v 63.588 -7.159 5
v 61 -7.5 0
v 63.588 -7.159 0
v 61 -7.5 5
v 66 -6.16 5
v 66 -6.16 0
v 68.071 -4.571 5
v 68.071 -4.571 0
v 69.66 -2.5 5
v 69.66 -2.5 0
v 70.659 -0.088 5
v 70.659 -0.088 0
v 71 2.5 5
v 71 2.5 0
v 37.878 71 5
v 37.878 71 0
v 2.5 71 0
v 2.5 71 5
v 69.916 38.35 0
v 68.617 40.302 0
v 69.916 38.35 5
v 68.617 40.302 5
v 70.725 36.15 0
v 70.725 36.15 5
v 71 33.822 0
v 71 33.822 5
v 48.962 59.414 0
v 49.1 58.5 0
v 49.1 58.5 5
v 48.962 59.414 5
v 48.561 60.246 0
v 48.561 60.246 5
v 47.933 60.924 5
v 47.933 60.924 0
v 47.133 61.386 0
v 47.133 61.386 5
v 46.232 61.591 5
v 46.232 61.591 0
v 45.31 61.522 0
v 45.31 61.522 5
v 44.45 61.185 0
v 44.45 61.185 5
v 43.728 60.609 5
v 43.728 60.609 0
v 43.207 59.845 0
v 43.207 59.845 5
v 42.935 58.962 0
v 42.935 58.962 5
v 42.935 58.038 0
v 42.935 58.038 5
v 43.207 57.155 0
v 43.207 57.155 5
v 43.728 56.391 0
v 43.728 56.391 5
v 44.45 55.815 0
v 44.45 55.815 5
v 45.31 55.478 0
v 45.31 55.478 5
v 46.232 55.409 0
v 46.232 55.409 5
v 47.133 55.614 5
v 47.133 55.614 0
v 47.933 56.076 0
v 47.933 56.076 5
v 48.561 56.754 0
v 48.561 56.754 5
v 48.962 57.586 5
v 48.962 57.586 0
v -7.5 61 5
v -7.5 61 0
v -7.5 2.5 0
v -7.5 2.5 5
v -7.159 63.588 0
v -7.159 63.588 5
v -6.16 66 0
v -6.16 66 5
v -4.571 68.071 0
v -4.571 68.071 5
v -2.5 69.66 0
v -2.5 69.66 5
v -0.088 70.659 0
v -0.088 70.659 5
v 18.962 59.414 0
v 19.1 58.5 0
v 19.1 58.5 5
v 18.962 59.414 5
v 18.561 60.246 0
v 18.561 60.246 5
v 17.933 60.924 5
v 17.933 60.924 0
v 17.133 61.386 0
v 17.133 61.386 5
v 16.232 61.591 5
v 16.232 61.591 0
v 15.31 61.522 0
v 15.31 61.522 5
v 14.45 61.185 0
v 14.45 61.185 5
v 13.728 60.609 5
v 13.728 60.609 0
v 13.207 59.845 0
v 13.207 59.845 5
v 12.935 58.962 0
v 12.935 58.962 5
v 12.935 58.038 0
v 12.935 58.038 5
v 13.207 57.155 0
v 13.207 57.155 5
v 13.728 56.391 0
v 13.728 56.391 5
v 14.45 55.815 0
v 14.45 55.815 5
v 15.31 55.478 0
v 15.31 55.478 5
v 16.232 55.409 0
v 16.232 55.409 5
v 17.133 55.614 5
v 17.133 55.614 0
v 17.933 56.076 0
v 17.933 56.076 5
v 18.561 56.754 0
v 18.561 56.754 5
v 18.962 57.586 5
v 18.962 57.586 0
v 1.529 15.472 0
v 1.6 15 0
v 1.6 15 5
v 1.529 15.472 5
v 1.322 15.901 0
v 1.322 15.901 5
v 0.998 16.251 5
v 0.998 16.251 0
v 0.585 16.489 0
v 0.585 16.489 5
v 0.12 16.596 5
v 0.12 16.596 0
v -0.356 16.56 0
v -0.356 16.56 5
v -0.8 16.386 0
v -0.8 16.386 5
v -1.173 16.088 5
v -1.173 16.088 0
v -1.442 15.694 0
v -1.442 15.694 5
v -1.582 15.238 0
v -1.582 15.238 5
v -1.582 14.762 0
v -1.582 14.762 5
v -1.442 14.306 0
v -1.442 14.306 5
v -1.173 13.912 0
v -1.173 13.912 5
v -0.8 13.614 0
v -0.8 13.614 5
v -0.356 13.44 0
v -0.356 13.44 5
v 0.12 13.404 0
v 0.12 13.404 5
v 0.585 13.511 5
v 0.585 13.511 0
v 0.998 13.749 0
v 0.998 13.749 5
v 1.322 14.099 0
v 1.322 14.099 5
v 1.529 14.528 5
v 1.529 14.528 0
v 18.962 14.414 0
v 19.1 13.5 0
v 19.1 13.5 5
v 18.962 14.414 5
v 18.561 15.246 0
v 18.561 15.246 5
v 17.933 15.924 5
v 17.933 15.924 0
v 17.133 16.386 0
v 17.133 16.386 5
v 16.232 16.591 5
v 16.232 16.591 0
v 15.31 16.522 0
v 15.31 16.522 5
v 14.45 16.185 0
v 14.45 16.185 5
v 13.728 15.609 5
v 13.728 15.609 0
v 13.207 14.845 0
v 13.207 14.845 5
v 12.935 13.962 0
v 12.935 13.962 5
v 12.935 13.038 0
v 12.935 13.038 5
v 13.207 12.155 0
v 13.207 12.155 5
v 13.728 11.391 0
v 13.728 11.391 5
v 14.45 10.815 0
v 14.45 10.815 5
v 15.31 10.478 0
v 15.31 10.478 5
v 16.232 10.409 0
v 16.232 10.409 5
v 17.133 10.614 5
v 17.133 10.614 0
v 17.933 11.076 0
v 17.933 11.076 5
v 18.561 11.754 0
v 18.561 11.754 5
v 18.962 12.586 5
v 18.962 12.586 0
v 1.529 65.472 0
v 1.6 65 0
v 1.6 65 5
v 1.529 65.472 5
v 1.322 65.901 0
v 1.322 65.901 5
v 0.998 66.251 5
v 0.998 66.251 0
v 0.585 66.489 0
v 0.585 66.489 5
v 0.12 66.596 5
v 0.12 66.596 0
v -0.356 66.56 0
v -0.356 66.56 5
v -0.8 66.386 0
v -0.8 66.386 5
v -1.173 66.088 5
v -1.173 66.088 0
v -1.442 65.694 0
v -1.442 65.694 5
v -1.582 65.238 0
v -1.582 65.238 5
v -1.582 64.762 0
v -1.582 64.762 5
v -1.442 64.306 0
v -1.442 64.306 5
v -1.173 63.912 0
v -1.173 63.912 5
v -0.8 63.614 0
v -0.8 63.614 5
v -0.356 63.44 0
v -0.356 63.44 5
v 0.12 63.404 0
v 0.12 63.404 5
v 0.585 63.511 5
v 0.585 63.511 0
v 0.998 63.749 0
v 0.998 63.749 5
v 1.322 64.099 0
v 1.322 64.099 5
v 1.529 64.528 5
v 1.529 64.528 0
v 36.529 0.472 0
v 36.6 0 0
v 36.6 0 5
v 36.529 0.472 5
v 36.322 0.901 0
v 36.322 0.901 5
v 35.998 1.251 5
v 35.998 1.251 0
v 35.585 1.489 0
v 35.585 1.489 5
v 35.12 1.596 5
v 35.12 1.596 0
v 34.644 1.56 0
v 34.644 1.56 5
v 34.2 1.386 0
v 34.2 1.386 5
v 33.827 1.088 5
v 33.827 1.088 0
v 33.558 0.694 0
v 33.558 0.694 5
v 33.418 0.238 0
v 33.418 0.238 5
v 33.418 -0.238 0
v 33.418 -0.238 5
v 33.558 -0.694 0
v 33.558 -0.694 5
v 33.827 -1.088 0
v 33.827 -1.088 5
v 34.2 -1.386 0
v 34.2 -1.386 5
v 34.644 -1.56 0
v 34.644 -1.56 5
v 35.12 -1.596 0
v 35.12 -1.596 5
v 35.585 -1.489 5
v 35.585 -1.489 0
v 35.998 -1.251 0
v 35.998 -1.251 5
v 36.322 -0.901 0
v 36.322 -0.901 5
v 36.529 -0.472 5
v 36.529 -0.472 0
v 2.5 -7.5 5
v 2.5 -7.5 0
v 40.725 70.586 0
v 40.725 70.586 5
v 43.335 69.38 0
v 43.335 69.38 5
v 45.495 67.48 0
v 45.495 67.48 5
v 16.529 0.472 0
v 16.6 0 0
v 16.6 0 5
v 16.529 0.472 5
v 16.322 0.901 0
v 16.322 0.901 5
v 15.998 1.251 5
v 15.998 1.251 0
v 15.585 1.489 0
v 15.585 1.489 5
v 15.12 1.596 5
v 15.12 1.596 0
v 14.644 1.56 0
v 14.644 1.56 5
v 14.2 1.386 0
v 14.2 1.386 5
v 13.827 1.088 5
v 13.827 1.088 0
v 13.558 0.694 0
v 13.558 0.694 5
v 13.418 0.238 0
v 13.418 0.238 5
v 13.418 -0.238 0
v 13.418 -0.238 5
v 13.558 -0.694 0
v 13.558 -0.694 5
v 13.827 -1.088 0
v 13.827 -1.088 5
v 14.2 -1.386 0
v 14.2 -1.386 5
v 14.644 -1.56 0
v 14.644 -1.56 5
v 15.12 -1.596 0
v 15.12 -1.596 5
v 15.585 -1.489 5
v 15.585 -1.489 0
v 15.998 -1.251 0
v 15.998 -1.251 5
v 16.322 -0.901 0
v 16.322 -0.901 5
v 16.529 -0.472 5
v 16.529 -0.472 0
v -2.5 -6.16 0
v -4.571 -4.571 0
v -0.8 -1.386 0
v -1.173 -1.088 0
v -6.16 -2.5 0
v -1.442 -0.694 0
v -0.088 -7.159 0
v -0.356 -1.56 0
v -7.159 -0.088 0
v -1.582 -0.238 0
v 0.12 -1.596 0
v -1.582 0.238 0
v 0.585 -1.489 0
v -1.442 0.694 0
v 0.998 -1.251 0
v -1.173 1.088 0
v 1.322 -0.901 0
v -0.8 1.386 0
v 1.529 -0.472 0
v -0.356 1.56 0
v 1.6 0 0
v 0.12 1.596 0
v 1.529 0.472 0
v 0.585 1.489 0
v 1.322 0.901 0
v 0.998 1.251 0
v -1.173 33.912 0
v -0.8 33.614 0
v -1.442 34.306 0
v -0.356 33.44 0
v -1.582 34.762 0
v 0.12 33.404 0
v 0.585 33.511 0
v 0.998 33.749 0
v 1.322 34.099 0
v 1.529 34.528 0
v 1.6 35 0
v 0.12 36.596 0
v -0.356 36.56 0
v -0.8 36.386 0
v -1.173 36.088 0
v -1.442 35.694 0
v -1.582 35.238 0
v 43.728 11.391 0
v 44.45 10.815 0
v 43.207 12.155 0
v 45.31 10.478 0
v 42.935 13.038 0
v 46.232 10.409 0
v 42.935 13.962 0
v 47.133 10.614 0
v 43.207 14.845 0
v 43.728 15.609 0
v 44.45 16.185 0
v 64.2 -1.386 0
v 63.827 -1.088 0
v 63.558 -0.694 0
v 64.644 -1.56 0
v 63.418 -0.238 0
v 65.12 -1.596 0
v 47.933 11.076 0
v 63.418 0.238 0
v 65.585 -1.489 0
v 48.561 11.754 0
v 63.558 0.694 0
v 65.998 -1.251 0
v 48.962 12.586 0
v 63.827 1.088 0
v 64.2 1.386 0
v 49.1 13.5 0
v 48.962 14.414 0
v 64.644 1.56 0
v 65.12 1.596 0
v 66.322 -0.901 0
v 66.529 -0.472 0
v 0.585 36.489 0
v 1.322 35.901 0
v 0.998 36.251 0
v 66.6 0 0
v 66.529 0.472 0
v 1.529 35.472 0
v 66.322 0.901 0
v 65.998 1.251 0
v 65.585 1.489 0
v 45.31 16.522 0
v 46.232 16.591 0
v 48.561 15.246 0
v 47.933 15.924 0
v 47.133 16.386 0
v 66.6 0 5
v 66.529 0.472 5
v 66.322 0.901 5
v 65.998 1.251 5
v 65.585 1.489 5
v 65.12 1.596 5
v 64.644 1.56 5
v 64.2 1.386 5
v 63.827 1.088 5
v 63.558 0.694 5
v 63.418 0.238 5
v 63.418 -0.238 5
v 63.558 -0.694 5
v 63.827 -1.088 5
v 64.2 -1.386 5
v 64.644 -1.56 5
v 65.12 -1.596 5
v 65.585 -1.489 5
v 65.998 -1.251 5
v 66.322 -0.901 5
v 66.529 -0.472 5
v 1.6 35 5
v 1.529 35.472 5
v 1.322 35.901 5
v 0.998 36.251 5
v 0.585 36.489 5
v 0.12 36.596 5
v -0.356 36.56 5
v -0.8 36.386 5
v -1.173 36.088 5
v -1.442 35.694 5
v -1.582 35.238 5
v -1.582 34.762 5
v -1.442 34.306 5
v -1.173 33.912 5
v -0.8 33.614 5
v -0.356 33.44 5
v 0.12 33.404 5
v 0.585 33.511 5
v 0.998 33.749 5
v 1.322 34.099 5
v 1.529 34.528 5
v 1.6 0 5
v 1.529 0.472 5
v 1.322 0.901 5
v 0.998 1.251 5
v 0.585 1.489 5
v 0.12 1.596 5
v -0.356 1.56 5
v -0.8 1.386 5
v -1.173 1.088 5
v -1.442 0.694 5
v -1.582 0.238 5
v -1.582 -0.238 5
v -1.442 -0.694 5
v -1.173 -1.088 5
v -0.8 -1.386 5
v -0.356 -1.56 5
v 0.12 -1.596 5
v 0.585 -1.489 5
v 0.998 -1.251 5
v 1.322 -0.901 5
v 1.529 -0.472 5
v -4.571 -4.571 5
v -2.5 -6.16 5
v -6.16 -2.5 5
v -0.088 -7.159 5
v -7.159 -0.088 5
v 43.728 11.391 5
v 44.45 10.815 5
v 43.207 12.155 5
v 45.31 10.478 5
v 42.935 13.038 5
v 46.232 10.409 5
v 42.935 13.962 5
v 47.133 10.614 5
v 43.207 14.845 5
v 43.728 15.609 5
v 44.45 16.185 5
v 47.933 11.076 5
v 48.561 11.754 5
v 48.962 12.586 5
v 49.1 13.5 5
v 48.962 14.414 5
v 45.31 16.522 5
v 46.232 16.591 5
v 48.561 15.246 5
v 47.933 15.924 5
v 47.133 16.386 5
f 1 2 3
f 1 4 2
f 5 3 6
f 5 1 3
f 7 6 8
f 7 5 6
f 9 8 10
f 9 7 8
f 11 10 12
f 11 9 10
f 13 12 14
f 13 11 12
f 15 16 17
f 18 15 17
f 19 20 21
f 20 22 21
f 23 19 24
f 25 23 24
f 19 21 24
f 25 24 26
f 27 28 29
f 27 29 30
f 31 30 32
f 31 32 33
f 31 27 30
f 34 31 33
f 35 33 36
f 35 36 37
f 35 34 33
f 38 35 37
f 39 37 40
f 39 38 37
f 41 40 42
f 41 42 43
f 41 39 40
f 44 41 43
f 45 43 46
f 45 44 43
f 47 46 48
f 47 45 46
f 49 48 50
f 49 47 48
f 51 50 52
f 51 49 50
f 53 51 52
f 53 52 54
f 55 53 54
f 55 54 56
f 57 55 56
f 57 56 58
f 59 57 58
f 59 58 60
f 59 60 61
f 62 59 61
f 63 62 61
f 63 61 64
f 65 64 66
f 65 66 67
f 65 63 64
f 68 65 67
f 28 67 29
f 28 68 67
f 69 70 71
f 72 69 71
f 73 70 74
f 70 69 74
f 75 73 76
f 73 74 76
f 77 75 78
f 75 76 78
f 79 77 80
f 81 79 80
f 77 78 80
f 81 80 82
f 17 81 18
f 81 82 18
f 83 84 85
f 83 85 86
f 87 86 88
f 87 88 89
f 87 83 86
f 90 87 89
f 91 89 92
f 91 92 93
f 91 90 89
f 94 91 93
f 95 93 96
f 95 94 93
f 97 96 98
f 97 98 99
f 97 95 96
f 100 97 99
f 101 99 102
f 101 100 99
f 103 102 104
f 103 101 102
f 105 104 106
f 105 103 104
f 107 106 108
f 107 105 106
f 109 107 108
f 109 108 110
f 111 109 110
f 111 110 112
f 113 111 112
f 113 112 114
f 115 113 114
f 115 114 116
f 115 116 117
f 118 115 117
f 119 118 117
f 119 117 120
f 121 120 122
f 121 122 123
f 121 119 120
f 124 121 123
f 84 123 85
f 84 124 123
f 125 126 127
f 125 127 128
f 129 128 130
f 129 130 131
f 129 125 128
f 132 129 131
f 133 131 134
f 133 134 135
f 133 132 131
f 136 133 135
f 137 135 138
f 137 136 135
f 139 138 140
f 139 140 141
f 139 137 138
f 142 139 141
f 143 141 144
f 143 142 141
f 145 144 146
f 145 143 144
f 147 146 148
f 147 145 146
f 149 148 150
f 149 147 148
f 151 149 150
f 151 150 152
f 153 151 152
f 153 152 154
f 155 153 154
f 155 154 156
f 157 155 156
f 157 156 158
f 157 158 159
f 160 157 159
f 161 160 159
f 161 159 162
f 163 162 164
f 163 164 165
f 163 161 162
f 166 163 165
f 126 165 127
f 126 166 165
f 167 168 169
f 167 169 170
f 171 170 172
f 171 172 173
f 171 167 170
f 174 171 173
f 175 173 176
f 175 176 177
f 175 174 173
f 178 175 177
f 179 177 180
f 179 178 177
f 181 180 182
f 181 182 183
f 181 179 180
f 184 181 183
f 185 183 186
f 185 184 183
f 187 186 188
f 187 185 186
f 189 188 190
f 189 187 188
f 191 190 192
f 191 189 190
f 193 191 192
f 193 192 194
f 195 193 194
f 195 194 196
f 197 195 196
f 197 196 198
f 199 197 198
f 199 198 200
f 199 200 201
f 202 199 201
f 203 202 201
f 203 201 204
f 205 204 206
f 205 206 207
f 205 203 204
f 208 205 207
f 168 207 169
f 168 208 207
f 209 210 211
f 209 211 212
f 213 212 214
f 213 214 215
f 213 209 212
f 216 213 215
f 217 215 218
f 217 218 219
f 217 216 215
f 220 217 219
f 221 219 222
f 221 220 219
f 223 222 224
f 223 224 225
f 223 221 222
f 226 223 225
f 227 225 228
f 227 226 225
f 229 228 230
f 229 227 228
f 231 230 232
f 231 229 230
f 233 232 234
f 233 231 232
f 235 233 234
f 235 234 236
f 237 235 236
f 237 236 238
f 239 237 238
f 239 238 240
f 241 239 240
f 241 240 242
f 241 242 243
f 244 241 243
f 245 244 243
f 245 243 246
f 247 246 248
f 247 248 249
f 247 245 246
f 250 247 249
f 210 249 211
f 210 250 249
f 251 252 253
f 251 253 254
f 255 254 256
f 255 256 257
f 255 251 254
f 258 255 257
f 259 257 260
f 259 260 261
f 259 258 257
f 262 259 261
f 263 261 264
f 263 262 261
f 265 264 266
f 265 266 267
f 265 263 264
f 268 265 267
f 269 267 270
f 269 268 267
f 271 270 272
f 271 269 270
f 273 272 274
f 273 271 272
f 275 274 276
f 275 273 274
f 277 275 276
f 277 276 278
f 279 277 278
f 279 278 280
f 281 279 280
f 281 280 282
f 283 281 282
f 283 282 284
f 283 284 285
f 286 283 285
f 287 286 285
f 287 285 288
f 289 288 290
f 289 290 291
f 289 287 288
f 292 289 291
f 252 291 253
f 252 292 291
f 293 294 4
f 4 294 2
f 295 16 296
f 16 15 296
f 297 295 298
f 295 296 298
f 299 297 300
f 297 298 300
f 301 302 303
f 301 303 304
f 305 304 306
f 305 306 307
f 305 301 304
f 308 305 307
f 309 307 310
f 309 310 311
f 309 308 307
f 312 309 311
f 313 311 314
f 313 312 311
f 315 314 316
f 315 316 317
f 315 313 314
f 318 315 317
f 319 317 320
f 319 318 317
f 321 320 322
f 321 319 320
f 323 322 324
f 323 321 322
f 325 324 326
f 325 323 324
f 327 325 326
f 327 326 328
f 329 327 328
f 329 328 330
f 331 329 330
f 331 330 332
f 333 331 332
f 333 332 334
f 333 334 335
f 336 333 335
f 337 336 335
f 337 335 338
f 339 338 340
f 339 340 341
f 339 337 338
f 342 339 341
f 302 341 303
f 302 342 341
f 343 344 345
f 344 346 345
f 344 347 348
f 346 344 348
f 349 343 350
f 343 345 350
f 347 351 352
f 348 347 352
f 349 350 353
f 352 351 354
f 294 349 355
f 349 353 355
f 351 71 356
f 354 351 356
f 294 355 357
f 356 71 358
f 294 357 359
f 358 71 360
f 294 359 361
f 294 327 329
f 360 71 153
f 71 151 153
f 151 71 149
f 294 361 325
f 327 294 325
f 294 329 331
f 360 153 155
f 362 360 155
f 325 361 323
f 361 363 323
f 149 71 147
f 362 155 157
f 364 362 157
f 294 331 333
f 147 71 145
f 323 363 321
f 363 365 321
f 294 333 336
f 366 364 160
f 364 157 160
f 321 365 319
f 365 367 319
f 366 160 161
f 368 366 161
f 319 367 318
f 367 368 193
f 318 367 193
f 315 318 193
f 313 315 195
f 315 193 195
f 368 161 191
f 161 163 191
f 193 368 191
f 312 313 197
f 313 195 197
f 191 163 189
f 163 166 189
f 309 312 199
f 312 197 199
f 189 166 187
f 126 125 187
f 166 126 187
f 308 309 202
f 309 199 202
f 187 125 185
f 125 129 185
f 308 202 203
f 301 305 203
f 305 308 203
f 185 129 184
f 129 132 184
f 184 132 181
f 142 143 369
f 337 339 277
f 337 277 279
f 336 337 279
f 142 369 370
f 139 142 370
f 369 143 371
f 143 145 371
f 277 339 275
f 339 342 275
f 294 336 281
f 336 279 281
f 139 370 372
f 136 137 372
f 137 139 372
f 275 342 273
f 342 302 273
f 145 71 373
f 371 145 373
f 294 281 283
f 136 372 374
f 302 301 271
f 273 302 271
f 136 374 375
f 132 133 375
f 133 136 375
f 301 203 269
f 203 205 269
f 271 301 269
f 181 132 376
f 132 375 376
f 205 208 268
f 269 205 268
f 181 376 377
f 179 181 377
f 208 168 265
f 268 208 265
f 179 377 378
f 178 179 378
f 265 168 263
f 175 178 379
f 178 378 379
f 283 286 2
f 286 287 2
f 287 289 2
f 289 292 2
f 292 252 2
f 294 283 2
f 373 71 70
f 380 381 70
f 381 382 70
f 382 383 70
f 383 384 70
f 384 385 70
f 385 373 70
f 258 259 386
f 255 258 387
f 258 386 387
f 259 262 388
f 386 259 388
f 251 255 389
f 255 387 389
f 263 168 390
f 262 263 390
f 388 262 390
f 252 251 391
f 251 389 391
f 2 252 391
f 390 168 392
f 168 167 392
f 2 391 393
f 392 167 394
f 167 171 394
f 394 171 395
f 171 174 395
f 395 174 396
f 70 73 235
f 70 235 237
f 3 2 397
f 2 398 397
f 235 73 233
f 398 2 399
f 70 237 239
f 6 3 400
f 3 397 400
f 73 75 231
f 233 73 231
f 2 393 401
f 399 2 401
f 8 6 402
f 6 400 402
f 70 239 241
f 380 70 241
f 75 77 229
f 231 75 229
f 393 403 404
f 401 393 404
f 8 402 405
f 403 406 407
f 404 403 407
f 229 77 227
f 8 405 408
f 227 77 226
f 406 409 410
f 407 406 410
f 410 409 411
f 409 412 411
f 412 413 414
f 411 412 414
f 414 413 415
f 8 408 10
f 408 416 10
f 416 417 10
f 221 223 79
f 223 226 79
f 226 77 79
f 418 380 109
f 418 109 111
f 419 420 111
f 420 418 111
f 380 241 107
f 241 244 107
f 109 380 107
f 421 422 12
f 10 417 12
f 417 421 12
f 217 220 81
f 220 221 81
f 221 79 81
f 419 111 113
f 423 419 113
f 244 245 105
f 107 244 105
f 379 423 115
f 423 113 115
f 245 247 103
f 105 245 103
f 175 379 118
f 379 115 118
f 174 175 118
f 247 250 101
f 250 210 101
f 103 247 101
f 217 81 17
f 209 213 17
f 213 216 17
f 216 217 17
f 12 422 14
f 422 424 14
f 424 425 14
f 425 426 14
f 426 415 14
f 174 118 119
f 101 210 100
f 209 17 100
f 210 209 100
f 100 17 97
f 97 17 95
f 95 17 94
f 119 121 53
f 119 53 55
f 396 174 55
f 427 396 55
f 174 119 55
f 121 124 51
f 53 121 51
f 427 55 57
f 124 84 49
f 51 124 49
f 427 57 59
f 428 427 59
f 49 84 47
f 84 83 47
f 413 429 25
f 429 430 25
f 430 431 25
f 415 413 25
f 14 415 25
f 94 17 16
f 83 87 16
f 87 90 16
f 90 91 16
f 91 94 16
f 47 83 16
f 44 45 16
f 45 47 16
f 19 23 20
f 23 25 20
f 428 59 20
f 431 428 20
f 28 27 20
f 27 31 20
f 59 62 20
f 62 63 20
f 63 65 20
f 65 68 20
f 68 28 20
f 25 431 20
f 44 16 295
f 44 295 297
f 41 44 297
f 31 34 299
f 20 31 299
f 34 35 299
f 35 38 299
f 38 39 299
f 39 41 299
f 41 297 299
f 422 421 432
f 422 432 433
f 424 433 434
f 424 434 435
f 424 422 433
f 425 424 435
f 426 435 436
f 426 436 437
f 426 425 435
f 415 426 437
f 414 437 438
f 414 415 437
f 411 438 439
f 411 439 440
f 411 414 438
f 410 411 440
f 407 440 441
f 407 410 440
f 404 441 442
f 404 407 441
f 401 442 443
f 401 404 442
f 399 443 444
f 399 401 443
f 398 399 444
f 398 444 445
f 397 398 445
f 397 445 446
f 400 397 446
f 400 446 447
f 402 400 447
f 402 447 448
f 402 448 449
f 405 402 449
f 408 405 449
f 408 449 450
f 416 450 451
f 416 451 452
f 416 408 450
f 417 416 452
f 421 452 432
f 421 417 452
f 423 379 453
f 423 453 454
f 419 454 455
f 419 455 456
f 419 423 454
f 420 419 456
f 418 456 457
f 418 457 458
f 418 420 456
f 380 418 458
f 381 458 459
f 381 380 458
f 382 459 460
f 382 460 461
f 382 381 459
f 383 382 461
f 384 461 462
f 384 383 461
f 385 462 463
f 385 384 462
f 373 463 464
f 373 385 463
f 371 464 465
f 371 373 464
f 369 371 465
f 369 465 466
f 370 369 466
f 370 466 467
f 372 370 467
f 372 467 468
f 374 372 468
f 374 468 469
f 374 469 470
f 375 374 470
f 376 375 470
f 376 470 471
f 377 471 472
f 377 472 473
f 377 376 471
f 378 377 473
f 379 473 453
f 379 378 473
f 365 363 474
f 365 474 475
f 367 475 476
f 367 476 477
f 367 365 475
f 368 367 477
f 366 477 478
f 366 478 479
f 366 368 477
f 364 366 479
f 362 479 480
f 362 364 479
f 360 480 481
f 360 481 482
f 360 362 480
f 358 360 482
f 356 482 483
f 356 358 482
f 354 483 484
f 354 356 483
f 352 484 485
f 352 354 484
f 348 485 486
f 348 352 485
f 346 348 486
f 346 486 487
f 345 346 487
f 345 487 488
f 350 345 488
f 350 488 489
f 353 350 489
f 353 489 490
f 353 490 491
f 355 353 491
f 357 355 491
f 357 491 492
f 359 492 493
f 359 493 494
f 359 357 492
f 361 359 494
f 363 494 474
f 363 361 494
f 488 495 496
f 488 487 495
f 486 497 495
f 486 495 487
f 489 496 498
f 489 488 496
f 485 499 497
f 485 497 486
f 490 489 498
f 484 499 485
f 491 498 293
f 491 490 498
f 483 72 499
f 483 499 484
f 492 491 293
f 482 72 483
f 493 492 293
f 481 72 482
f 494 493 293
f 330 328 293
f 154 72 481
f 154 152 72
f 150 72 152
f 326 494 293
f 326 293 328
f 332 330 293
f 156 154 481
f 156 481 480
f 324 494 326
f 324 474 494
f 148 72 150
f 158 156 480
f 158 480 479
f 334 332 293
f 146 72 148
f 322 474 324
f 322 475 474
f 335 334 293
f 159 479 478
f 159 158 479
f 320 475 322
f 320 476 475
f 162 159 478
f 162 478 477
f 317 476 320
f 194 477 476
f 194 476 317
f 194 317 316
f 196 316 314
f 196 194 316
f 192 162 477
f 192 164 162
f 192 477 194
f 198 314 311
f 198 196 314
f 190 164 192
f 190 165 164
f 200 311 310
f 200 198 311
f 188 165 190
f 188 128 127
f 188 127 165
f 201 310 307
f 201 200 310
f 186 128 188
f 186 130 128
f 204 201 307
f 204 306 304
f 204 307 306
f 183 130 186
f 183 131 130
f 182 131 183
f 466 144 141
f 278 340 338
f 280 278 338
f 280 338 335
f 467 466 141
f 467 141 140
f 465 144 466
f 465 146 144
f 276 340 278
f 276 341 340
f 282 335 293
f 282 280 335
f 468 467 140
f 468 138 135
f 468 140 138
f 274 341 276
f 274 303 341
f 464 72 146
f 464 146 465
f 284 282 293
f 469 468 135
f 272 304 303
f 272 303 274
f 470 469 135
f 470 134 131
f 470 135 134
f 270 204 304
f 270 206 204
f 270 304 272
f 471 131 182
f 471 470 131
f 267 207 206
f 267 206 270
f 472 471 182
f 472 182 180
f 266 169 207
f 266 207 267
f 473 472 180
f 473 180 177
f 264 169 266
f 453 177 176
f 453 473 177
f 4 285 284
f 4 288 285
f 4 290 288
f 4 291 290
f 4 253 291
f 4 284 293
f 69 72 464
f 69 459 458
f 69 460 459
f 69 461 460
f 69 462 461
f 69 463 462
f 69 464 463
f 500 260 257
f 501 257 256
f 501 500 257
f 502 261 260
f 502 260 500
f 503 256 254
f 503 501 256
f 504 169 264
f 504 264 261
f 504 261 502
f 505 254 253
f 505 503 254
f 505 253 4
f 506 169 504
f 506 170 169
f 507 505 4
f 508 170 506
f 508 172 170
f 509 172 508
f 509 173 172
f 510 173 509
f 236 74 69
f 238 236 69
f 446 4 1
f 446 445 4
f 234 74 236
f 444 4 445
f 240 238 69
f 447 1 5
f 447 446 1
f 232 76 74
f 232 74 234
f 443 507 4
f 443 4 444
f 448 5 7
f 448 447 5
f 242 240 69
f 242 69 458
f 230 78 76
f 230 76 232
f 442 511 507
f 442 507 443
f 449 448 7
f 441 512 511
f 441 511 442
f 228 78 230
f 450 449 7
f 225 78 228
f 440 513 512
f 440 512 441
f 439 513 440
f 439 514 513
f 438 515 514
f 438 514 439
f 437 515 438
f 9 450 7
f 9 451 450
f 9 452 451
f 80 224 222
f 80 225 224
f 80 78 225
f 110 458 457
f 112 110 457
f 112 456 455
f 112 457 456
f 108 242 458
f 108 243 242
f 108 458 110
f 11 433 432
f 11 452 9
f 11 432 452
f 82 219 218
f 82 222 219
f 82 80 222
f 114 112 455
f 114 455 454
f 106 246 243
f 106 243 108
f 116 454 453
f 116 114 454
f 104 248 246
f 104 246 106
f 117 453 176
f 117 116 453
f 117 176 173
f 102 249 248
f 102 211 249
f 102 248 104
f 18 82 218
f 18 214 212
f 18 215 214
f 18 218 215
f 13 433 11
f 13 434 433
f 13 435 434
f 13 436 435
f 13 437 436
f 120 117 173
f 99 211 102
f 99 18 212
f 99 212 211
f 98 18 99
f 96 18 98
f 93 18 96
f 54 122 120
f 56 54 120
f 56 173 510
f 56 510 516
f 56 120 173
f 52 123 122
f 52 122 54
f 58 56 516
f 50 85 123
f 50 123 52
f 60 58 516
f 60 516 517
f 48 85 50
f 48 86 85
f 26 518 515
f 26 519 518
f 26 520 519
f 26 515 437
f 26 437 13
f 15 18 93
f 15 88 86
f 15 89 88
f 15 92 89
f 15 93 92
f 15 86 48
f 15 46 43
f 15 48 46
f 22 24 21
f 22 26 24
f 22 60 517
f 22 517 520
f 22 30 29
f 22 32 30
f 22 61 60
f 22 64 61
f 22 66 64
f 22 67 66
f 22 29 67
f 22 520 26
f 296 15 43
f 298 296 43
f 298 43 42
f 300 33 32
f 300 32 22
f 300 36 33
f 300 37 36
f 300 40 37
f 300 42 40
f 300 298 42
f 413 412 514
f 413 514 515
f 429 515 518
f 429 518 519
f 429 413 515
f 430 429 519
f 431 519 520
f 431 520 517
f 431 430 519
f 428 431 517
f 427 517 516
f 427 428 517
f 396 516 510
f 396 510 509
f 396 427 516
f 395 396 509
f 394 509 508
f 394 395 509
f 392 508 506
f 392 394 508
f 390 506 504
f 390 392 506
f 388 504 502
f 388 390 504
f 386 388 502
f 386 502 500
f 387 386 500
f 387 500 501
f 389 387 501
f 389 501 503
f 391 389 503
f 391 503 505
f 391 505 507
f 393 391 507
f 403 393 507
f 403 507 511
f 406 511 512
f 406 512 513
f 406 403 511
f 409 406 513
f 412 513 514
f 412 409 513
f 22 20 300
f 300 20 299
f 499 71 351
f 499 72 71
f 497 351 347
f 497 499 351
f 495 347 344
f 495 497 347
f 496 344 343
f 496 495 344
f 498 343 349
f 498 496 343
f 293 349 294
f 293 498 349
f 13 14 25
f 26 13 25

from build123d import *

# Parameters (mm, degrees)
SKETCH_1_R      = 1.6
SKETCH_1_R_2    = 3.1
EXTRUDE_1_DEPTH = 5
FILLET_1_R      = 10


with BuildPart() as part:
    # 草图1 → 凸台-拉伸1 (new body)
    with BuildSketch(Plane.XY):
        Polygon((-7.5, 71), (-7.5, -7.5), (71, -7.5), (71, 37.5), (42.5, 71), align=None)
        Circle(SKETCH_1_R, mode=Mode.SUBTRACT)
        with Locations((0, 15)):
            Circle(SKETCH_1_R, mode=Mode.SUBTRACT)
        with Locations((0, 35)):
            Circle(SKETCH_1_R, mode=Mode.SUBTRACT)
        with Locations((0, 65)):
            Circle(SKETCH_1_R, mode=Mode.SUBTRACT)
        with Locations((15, 0)):
            Circle(SKETCH_1_R, mode=Mode.SUBTRACT)
        with Locations((35, 0)):
            Circle(SKETCH_1_R, mode=Mode.SUBTRACT)
        with Locations((65, 0)):
            Circle(SKETCH_1_R, mode=Mode.SUBTRACT)
        with Locations((16, 58.5)):
            Circle(SKETCH_1_R_2, mode=Mode.SUBTRACT)
        with Locations((16, 13.5)):
            Circle(SKETCH_1_R_2, mode=Mode.SUBTRACT)
        with Locations((46, 13.5)):
            Circle(SKETCH_1_R_2, mode=Mode.SUBTRACT)
        with Locations((46, 58.5)):
            Circle(SKETCH_1_R_2, mode=Mode.SUBTRACT)
    extrude(amount=EXTRUDE_1_DEPTH)

    # 圆角1
    fillet_1_edges = [part.edges().sort_by_distance(p)[0] for p in [
        (42.5, 71, 2.5),
        (71, 37.5, 2.5),
        (71, -7.5, 2.5),
        (-7.5, -7.5, 2.5),
        (-7.5, 71, 2.5),
    ]]
    fillet(fillet_1_edges, radius=FILLET_1_R)


solid = part.part
